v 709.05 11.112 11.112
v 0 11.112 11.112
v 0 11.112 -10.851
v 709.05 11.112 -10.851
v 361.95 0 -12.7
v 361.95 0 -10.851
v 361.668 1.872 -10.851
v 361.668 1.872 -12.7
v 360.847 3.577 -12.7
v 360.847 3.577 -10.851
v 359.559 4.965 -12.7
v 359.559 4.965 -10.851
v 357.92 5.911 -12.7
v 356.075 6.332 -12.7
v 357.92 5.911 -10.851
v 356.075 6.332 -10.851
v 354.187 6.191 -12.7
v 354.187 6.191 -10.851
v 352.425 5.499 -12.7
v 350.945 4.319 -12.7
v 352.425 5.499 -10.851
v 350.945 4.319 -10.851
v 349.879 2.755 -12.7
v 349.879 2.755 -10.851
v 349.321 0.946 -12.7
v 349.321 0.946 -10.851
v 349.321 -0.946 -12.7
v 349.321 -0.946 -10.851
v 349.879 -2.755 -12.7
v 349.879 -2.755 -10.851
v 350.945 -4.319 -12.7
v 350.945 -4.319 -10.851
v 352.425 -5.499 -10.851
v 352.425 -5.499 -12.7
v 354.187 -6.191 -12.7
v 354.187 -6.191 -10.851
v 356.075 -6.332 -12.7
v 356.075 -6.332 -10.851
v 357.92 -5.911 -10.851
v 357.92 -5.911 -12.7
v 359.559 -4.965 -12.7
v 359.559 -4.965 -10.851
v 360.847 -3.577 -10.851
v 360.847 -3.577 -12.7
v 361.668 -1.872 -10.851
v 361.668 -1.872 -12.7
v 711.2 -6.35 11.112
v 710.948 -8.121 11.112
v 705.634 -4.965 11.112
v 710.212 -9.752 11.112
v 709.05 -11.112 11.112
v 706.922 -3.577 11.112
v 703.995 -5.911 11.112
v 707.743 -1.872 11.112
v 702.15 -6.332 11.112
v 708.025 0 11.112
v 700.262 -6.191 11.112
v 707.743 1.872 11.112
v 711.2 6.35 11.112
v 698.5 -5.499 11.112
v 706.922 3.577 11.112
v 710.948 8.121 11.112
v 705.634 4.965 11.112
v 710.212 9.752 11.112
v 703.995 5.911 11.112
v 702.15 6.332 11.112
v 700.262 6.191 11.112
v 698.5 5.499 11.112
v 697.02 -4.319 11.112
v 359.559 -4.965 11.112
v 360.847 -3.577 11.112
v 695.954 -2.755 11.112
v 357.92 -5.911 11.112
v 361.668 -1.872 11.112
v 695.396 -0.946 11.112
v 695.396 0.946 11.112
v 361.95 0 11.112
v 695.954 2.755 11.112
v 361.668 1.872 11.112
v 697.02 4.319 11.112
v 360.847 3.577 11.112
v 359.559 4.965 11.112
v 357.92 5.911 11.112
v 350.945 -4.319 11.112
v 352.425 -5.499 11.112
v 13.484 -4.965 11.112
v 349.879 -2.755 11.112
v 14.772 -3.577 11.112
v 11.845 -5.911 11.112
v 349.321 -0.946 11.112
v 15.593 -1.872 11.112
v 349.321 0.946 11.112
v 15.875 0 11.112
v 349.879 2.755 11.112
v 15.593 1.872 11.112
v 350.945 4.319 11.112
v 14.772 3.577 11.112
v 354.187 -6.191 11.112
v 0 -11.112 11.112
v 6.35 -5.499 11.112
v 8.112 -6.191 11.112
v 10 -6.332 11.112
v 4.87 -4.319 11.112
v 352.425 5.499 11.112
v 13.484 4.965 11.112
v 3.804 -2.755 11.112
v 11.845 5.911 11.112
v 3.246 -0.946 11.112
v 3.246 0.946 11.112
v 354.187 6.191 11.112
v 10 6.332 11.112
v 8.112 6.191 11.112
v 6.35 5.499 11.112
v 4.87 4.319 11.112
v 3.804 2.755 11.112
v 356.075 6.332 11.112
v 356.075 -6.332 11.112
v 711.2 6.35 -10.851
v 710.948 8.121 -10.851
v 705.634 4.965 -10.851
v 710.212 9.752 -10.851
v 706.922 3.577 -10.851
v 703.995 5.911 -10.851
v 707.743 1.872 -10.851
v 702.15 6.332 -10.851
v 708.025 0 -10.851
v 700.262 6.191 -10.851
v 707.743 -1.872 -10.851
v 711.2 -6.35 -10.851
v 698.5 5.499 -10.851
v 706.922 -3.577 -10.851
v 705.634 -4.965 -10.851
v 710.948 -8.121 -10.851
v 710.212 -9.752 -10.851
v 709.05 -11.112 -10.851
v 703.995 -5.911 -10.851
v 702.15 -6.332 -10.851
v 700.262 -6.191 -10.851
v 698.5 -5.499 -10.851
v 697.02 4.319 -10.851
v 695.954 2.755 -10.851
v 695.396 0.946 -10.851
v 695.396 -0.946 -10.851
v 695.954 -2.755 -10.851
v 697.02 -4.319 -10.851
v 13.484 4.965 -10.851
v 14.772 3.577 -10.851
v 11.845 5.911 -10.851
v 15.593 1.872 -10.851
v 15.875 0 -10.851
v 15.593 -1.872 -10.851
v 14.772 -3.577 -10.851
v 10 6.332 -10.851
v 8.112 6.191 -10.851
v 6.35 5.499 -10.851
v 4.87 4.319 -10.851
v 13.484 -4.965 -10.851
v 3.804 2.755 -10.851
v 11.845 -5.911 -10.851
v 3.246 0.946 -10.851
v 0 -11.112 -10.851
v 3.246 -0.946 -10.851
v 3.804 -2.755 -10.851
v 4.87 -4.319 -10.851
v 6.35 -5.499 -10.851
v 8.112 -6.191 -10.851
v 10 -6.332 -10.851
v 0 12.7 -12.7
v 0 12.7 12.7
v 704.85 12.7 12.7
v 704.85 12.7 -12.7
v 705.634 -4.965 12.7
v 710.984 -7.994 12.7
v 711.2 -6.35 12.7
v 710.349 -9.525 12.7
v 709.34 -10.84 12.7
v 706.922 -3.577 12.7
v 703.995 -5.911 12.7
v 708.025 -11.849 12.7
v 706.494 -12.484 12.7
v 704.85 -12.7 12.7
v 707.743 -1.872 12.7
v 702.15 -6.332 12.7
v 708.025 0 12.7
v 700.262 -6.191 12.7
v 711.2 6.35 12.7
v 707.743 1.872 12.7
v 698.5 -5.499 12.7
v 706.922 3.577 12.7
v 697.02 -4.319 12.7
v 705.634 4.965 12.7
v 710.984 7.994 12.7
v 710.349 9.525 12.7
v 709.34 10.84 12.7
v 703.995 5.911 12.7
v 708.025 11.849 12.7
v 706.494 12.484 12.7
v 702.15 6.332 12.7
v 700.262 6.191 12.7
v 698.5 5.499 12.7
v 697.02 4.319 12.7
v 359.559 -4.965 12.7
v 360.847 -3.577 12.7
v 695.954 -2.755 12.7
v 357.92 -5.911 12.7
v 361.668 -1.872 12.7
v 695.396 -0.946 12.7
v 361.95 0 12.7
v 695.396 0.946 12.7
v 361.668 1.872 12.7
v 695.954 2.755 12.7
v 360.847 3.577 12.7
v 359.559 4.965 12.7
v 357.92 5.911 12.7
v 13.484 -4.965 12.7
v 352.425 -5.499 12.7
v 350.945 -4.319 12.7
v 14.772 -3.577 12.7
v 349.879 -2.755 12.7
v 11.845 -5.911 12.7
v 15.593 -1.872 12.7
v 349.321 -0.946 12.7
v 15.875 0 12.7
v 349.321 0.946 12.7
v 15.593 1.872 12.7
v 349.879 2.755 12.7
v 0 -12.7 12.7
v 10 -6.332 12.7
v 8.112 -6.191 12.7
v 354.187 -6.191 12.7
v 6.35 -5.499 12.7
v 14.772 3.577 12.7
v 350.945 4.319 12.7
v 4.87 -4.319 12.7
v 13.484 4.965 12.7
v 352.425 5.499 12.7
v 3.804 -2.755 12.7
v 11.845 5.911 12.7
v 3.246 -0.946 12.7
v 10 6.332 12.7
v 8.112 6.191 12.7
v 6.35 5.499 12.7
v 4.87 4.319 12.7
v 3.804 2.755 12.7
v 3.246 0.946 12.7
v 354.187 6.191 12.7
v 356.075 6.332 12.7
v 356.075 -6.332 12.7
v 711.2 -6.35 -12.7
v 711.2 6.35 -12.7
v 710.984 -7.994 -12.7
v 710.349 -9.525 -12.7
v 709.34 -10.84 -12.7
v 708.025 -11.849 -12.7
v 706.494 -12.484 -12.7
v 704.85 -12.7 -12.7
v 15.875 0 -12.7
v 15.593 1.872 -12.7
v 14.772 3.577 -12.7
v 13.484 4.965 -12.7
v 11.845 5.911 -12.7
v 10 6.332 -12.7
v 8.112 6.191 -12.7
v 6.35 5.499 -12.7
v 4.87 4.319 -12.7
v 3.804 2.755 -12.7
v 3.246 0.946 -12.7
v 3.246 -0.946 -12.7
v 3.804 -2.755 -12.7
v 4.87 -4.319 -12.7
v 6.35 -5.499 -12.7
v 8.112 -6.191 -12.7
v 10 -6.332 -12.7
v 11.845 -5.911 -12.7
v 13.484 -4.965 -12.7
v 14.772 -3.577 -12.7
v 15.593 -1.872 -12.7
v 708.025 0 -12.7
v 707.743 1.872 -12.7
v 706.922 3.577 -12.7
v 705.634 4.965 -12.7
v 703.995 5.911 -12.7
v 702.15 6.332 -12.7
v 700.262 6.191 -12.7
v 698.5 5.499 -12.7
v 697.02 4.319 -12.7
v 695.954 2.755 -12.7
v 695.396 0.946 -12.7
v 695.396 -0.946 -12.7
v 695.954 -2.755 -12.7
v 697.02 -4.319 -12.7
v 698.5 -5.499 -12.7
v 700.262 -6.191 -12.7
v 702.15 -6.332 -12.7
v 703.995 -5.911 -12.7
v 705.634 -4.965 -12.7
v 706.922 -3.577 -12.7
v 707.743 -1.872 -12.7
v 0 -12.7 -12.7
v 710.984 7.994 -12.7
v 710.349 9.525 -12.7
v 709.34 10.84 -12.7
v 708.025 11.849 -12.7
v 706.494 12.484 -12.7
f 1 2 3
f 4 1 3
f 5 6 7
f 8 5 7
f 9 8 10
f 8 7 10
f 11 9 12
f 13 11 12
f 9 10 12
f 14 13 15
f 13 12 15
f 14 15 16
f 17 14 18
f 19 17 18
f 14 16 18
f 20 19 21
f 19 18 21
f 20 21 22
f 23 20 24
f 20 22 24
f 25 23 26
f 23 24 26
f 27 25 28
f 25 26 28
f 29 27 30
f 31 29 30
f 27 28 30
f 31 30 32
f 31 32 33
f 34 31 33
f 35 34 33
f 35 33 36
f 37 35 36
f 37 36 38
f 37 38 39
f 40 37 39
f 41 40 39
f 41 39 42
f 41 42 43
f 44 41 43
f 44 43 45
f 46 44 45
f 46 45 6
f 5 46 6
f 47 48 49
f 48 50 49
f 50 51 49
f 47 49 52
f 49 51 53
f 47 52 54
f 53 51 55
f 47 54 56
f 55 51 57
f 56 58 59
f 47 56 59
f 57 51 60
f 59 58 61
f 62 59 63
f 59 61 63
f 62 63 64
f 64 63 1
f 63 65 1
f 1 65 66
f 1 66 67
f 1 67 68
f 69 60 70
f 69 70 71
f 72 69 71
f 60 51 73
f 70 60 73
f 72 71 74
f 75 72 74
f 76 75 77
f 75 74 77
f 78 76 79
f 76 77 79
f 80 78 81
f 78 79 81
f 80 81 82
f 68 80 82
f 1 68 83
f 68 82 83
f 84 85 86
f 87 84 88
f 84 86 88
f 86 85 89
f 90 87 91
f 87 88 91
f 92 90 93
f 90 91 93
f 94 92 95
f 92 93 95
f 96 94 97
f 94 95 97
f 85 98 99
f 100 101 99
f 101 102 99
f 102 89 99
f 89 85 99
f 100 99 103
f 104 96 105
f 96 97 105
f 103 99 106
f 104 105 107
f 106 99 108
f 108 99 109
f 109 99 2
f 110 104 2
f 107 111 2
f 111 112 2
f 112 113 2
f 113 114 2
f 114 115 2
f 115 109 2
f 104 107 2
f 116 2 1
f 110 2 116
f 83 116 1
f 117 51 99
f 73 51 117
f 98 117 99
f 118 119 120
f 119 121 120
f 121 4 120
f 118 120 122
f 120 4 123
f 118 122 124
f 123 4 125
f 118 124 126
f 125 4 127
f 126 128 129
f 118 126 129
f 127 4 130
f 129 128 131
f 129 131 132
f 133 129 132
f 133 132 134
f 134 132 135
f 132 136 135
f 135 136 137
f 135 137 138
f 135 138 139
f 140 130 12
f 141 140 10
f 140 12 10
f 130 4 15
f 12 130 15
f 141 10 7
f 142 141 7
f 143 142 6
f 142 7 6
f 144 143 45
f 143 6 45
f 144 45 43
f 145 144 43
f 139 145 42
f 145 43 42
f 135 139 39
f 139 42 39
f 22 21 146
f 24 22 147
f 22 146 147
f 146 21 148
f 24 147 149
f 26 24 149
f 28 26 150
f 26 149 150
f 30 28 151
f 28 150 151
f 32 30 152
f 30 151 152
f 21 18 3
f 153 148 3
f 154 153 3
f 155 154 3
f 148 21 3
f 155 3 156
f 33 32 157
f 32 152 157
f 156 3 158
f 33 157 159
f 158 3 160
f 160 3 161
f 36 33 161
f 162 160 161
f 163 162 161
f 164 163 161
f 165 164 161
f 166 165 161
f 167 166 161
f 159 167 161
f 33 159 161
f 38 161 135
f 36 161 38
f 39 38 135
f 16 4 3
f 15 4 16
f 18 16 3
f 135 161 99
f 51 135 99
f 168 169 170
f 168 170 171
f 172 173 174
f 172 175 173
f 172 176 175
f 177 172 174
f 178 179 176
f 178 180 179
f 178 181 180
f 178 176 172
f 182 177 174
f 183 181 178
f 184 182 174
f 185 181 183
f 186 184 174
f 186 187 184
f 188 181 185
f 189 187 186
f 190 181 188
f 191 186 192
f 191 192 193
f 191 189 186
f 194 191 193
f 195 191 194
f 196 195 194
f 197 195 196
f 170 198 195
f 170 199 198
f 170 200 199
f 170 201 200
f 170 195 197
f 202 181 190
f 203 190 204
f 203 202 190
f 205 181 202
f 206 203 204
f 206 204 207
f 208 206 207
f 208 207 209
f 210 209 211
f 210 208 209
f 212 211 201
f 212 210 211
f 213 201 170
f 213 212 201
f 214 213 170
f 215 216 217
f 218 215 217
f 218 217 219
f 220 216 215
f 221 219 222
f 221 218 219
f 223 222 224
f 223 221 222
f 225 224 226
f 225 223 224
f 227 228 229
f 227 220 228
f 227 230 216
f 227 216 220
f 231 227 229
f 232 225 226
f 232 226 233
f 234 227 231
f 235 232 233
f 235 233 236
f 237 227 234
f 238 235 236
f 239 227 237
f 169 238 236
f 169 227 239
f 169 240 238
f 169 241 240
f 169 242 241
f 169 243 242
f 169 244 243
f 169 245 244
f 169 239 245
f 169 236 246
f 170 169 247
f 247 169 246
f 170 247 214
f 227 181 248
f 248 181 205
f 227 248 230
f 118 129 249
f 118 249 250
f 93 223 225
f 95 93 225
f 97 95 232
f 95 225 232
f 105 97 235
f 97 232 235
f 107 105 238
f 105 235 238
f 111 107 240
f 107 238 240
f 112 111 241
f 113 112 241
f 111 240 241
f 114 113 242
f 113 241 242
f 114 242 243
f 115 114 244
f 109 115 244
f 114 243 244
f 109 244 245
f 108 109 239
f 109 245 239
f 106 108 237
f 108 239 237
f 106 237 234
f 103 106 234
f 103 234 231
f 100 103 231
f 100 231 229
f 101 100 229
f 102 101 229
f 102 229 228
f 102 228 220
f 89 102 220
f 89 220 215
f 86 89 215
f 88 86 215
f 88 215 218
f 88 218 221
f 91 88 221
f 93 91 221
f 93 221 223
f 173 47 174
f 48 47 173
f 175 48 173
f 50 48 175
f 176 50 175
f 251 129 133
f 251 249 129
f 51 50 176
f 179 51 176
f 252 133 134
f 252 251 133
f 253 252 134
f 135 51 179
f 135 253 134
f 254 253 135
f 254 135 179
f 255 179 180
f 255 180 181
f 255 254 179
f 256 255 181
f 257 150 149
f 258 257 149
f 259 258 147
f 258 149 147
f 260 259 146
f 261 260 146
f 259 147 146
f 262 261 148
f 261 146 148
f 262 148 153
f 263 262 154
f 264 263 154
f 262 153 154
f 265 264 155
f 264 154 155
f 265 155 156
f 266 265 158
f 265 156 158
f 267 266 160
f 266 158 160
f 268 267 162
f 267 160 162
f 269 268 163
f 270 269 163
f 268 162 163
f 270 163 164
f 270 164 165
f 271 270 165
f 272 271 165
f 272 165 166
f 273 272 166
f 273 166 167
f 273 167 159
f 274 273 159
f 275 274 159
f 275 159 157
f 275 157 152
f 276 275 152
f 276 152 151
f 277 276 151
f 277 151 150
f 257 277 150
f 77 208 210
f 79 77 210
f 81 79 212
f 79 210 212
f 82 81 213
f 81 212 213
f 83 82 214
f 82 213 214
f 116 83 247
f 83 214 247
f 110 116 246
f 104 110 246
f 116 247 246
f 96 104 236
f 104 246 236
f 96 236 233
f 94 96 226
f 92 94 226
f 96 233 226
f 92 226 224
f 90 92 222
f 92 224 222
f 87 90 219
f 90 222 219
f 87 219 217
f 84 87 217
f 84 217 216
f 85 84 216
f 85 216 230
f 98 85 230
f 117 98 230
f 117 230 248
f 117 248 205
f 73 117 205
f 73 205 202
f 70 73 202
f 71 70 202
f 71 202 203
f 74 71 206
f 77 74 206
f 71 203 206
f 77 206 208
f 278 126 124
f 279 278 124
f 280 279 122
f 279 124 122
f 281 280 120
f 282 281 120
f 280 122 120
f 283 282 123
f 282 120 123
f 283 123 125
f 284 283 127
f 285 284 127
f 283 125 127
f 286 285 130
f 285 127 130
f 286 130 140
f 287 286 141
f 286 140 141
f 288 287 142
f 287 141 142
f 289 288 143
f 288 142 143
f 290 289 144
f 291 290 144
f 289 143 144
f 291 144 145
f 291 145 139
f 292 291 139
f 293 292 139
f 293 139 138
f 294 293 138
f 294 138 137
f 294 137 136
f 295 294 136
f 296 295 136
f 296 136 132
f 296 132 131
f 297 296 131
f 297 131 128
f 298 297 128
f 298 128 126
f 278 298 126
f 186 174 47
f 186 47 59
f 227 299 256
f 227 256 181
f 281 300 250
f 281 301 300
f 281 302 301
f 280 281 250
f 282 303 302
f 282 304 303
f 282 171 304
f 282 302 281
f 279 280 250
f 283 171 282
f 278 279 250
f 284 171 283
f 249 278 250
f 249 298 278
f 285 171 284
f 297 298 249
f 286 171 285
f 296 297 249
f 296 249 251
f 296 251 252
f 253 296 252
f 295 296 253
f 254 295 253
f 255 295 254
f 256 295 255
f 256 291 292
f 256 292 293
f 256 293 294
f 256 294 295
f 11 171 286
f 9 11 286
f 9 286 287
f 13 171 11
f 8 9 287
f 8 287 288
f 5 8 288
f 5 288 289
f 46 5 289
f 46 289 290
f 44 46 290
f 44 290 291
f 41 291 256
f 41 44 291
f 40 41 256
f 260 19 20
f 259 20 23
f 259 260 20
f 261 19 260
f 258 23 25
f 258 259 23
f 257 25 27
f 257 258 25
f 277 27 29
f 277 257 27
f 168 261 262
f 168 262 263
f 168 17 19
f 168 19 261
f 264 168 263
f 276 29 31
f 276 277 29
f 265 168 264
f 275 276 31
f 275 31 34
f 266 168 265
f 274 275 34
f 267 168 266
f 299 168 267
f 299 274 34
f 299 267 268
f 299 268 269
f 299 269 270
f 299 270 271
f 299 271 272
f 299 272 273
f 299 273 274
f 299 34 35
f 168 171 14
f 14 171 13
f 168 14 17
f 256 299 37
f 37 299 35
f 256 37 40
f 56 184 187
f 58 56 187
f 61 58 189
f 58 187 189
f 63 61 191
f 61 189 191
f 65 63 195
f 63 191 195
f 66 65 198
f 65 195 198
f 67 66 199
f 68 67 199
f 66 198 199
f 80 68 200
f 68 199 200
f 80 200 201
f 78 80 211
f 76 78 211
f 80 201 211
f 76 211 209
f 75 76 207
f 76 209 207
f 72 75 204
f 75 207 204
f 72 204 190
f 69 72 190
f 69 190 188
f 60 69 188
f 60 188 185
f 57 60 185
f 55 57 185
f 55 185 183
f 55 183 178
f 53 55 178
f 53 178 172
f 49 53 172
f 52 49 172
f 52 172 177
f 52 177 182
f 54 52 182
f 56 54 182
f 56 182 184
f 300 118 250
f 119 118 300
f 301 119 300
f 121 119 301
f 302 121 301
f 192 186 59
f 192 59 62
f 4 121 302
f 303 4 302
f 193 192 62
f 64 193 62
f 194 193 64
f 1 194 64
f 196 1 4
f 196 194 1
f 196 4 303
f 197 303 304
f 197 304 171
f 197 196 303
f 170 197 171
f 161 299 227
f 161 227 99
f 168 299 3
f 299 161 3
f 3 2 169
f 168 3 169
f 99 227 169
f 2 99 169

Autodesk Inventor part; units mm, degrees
ref_plane "YZ Plane" through (0, 0, 0) normal (1, 0, 0) x (0, 1, 0)
ref_plane "XZ Plane" through (0, 0, 0) normal (0, 1, 0) x (-1, 0, 0)
ref_plane "XY Plane" through (0, 0, 0) normal (0, 0, 1) x (1, 0, 0)
sketch "Sketch1" plane through (0, 0, 0) normal (1, 0, 0) x (0, 1, 0)
  line L0 (-12.7, 12.7) -> (12.7, 12.7)
  line L1 (12.7, 12.7) -> (12.7, -12.7)
  line L2 (12.7, -12.7) -> (-12.7, -12.7)
  line L3 (-12.7, -12.7) -> (-12.7, 12.7)
  line L4 (-11.1125, 11.1125) -> (11.1125, 11.1125)
  line L5 (11.1125, 11.1125) -> (11.1125, -10.8514)
  line L6 (11.1125, -10.8514) -> (-11.1125, -10.8514)
  line L7 (-11.1125, -10.8514) -> (-11.1125, 11.1125)
  point P0 (0, 0)
  point P1 (0, 12.7)
  point P2 (-12.7, 0)
  dimension "d0" = 25.4
  dimension "d1" = 25.4
  dimension "d2" = 1.5875
  dimension "d3" = 1.5875
  dimension "d4" = 1.5875
extrude "Extrusion1" add sketch "Sketch1" along normal blind 711.2
sketch "Sketch2" plane through (0, -12.7, 12.7) normal (0, 0, 1) x (1, 0, 0)
  circle A0 centre (9.525, 12.7) radius 6.35
  circle A1 centre (701.675, 12.7) radius 6.35
  line L0 (711.2, 25.4) -> (711.2, 0) projected
  line L1 (0, 0) -> (0, 25.4) projected
  line L2 (0, 0) -> (711.2, 0) projected
  circle A2 centre (355.6, 12.7) radius 6.35
  point P0 (0, 12.7)
  point P1 (395.7549, 0)
  point P2 (355.6, 0)
  dimension "d7" = 12.7
  dimension "d8" = 9.525
  dimension "d9" = 12.7
  dimension "d10" = 9.525
  dimension "d17" = 12.7
  dimension "d23" = 355.6
  dimension "BarLengthRef" = 711.2
extrude "Extrusion2" cut sketch "Sketch2" against normal blind 50.8 contours A0 | A1
extrude "Extrusion4" cut sketch "Sketch2" against normal blind 25.4 contours A2
fillet "Fillet1" radius 6.35 1 edges at (711.2, 12.7, 0)
fillet "Fillet2" radius 6.35 1 edges at (711.2, -12.7, 0)
equation "\"d1\" = d0"
equation "\"d3\" = d2"
equation "\"d4\" = d2"
equation "\"d9\" = d7"
equation "\"d10\" = d8"
equation "\"d17\" = d7"
equation "\"d23\" = 0.5 * BarLengthRef"
equation "\"XLS_Barlength\" = 711.2"
properties part number "2018 Long Bar Offset center"
